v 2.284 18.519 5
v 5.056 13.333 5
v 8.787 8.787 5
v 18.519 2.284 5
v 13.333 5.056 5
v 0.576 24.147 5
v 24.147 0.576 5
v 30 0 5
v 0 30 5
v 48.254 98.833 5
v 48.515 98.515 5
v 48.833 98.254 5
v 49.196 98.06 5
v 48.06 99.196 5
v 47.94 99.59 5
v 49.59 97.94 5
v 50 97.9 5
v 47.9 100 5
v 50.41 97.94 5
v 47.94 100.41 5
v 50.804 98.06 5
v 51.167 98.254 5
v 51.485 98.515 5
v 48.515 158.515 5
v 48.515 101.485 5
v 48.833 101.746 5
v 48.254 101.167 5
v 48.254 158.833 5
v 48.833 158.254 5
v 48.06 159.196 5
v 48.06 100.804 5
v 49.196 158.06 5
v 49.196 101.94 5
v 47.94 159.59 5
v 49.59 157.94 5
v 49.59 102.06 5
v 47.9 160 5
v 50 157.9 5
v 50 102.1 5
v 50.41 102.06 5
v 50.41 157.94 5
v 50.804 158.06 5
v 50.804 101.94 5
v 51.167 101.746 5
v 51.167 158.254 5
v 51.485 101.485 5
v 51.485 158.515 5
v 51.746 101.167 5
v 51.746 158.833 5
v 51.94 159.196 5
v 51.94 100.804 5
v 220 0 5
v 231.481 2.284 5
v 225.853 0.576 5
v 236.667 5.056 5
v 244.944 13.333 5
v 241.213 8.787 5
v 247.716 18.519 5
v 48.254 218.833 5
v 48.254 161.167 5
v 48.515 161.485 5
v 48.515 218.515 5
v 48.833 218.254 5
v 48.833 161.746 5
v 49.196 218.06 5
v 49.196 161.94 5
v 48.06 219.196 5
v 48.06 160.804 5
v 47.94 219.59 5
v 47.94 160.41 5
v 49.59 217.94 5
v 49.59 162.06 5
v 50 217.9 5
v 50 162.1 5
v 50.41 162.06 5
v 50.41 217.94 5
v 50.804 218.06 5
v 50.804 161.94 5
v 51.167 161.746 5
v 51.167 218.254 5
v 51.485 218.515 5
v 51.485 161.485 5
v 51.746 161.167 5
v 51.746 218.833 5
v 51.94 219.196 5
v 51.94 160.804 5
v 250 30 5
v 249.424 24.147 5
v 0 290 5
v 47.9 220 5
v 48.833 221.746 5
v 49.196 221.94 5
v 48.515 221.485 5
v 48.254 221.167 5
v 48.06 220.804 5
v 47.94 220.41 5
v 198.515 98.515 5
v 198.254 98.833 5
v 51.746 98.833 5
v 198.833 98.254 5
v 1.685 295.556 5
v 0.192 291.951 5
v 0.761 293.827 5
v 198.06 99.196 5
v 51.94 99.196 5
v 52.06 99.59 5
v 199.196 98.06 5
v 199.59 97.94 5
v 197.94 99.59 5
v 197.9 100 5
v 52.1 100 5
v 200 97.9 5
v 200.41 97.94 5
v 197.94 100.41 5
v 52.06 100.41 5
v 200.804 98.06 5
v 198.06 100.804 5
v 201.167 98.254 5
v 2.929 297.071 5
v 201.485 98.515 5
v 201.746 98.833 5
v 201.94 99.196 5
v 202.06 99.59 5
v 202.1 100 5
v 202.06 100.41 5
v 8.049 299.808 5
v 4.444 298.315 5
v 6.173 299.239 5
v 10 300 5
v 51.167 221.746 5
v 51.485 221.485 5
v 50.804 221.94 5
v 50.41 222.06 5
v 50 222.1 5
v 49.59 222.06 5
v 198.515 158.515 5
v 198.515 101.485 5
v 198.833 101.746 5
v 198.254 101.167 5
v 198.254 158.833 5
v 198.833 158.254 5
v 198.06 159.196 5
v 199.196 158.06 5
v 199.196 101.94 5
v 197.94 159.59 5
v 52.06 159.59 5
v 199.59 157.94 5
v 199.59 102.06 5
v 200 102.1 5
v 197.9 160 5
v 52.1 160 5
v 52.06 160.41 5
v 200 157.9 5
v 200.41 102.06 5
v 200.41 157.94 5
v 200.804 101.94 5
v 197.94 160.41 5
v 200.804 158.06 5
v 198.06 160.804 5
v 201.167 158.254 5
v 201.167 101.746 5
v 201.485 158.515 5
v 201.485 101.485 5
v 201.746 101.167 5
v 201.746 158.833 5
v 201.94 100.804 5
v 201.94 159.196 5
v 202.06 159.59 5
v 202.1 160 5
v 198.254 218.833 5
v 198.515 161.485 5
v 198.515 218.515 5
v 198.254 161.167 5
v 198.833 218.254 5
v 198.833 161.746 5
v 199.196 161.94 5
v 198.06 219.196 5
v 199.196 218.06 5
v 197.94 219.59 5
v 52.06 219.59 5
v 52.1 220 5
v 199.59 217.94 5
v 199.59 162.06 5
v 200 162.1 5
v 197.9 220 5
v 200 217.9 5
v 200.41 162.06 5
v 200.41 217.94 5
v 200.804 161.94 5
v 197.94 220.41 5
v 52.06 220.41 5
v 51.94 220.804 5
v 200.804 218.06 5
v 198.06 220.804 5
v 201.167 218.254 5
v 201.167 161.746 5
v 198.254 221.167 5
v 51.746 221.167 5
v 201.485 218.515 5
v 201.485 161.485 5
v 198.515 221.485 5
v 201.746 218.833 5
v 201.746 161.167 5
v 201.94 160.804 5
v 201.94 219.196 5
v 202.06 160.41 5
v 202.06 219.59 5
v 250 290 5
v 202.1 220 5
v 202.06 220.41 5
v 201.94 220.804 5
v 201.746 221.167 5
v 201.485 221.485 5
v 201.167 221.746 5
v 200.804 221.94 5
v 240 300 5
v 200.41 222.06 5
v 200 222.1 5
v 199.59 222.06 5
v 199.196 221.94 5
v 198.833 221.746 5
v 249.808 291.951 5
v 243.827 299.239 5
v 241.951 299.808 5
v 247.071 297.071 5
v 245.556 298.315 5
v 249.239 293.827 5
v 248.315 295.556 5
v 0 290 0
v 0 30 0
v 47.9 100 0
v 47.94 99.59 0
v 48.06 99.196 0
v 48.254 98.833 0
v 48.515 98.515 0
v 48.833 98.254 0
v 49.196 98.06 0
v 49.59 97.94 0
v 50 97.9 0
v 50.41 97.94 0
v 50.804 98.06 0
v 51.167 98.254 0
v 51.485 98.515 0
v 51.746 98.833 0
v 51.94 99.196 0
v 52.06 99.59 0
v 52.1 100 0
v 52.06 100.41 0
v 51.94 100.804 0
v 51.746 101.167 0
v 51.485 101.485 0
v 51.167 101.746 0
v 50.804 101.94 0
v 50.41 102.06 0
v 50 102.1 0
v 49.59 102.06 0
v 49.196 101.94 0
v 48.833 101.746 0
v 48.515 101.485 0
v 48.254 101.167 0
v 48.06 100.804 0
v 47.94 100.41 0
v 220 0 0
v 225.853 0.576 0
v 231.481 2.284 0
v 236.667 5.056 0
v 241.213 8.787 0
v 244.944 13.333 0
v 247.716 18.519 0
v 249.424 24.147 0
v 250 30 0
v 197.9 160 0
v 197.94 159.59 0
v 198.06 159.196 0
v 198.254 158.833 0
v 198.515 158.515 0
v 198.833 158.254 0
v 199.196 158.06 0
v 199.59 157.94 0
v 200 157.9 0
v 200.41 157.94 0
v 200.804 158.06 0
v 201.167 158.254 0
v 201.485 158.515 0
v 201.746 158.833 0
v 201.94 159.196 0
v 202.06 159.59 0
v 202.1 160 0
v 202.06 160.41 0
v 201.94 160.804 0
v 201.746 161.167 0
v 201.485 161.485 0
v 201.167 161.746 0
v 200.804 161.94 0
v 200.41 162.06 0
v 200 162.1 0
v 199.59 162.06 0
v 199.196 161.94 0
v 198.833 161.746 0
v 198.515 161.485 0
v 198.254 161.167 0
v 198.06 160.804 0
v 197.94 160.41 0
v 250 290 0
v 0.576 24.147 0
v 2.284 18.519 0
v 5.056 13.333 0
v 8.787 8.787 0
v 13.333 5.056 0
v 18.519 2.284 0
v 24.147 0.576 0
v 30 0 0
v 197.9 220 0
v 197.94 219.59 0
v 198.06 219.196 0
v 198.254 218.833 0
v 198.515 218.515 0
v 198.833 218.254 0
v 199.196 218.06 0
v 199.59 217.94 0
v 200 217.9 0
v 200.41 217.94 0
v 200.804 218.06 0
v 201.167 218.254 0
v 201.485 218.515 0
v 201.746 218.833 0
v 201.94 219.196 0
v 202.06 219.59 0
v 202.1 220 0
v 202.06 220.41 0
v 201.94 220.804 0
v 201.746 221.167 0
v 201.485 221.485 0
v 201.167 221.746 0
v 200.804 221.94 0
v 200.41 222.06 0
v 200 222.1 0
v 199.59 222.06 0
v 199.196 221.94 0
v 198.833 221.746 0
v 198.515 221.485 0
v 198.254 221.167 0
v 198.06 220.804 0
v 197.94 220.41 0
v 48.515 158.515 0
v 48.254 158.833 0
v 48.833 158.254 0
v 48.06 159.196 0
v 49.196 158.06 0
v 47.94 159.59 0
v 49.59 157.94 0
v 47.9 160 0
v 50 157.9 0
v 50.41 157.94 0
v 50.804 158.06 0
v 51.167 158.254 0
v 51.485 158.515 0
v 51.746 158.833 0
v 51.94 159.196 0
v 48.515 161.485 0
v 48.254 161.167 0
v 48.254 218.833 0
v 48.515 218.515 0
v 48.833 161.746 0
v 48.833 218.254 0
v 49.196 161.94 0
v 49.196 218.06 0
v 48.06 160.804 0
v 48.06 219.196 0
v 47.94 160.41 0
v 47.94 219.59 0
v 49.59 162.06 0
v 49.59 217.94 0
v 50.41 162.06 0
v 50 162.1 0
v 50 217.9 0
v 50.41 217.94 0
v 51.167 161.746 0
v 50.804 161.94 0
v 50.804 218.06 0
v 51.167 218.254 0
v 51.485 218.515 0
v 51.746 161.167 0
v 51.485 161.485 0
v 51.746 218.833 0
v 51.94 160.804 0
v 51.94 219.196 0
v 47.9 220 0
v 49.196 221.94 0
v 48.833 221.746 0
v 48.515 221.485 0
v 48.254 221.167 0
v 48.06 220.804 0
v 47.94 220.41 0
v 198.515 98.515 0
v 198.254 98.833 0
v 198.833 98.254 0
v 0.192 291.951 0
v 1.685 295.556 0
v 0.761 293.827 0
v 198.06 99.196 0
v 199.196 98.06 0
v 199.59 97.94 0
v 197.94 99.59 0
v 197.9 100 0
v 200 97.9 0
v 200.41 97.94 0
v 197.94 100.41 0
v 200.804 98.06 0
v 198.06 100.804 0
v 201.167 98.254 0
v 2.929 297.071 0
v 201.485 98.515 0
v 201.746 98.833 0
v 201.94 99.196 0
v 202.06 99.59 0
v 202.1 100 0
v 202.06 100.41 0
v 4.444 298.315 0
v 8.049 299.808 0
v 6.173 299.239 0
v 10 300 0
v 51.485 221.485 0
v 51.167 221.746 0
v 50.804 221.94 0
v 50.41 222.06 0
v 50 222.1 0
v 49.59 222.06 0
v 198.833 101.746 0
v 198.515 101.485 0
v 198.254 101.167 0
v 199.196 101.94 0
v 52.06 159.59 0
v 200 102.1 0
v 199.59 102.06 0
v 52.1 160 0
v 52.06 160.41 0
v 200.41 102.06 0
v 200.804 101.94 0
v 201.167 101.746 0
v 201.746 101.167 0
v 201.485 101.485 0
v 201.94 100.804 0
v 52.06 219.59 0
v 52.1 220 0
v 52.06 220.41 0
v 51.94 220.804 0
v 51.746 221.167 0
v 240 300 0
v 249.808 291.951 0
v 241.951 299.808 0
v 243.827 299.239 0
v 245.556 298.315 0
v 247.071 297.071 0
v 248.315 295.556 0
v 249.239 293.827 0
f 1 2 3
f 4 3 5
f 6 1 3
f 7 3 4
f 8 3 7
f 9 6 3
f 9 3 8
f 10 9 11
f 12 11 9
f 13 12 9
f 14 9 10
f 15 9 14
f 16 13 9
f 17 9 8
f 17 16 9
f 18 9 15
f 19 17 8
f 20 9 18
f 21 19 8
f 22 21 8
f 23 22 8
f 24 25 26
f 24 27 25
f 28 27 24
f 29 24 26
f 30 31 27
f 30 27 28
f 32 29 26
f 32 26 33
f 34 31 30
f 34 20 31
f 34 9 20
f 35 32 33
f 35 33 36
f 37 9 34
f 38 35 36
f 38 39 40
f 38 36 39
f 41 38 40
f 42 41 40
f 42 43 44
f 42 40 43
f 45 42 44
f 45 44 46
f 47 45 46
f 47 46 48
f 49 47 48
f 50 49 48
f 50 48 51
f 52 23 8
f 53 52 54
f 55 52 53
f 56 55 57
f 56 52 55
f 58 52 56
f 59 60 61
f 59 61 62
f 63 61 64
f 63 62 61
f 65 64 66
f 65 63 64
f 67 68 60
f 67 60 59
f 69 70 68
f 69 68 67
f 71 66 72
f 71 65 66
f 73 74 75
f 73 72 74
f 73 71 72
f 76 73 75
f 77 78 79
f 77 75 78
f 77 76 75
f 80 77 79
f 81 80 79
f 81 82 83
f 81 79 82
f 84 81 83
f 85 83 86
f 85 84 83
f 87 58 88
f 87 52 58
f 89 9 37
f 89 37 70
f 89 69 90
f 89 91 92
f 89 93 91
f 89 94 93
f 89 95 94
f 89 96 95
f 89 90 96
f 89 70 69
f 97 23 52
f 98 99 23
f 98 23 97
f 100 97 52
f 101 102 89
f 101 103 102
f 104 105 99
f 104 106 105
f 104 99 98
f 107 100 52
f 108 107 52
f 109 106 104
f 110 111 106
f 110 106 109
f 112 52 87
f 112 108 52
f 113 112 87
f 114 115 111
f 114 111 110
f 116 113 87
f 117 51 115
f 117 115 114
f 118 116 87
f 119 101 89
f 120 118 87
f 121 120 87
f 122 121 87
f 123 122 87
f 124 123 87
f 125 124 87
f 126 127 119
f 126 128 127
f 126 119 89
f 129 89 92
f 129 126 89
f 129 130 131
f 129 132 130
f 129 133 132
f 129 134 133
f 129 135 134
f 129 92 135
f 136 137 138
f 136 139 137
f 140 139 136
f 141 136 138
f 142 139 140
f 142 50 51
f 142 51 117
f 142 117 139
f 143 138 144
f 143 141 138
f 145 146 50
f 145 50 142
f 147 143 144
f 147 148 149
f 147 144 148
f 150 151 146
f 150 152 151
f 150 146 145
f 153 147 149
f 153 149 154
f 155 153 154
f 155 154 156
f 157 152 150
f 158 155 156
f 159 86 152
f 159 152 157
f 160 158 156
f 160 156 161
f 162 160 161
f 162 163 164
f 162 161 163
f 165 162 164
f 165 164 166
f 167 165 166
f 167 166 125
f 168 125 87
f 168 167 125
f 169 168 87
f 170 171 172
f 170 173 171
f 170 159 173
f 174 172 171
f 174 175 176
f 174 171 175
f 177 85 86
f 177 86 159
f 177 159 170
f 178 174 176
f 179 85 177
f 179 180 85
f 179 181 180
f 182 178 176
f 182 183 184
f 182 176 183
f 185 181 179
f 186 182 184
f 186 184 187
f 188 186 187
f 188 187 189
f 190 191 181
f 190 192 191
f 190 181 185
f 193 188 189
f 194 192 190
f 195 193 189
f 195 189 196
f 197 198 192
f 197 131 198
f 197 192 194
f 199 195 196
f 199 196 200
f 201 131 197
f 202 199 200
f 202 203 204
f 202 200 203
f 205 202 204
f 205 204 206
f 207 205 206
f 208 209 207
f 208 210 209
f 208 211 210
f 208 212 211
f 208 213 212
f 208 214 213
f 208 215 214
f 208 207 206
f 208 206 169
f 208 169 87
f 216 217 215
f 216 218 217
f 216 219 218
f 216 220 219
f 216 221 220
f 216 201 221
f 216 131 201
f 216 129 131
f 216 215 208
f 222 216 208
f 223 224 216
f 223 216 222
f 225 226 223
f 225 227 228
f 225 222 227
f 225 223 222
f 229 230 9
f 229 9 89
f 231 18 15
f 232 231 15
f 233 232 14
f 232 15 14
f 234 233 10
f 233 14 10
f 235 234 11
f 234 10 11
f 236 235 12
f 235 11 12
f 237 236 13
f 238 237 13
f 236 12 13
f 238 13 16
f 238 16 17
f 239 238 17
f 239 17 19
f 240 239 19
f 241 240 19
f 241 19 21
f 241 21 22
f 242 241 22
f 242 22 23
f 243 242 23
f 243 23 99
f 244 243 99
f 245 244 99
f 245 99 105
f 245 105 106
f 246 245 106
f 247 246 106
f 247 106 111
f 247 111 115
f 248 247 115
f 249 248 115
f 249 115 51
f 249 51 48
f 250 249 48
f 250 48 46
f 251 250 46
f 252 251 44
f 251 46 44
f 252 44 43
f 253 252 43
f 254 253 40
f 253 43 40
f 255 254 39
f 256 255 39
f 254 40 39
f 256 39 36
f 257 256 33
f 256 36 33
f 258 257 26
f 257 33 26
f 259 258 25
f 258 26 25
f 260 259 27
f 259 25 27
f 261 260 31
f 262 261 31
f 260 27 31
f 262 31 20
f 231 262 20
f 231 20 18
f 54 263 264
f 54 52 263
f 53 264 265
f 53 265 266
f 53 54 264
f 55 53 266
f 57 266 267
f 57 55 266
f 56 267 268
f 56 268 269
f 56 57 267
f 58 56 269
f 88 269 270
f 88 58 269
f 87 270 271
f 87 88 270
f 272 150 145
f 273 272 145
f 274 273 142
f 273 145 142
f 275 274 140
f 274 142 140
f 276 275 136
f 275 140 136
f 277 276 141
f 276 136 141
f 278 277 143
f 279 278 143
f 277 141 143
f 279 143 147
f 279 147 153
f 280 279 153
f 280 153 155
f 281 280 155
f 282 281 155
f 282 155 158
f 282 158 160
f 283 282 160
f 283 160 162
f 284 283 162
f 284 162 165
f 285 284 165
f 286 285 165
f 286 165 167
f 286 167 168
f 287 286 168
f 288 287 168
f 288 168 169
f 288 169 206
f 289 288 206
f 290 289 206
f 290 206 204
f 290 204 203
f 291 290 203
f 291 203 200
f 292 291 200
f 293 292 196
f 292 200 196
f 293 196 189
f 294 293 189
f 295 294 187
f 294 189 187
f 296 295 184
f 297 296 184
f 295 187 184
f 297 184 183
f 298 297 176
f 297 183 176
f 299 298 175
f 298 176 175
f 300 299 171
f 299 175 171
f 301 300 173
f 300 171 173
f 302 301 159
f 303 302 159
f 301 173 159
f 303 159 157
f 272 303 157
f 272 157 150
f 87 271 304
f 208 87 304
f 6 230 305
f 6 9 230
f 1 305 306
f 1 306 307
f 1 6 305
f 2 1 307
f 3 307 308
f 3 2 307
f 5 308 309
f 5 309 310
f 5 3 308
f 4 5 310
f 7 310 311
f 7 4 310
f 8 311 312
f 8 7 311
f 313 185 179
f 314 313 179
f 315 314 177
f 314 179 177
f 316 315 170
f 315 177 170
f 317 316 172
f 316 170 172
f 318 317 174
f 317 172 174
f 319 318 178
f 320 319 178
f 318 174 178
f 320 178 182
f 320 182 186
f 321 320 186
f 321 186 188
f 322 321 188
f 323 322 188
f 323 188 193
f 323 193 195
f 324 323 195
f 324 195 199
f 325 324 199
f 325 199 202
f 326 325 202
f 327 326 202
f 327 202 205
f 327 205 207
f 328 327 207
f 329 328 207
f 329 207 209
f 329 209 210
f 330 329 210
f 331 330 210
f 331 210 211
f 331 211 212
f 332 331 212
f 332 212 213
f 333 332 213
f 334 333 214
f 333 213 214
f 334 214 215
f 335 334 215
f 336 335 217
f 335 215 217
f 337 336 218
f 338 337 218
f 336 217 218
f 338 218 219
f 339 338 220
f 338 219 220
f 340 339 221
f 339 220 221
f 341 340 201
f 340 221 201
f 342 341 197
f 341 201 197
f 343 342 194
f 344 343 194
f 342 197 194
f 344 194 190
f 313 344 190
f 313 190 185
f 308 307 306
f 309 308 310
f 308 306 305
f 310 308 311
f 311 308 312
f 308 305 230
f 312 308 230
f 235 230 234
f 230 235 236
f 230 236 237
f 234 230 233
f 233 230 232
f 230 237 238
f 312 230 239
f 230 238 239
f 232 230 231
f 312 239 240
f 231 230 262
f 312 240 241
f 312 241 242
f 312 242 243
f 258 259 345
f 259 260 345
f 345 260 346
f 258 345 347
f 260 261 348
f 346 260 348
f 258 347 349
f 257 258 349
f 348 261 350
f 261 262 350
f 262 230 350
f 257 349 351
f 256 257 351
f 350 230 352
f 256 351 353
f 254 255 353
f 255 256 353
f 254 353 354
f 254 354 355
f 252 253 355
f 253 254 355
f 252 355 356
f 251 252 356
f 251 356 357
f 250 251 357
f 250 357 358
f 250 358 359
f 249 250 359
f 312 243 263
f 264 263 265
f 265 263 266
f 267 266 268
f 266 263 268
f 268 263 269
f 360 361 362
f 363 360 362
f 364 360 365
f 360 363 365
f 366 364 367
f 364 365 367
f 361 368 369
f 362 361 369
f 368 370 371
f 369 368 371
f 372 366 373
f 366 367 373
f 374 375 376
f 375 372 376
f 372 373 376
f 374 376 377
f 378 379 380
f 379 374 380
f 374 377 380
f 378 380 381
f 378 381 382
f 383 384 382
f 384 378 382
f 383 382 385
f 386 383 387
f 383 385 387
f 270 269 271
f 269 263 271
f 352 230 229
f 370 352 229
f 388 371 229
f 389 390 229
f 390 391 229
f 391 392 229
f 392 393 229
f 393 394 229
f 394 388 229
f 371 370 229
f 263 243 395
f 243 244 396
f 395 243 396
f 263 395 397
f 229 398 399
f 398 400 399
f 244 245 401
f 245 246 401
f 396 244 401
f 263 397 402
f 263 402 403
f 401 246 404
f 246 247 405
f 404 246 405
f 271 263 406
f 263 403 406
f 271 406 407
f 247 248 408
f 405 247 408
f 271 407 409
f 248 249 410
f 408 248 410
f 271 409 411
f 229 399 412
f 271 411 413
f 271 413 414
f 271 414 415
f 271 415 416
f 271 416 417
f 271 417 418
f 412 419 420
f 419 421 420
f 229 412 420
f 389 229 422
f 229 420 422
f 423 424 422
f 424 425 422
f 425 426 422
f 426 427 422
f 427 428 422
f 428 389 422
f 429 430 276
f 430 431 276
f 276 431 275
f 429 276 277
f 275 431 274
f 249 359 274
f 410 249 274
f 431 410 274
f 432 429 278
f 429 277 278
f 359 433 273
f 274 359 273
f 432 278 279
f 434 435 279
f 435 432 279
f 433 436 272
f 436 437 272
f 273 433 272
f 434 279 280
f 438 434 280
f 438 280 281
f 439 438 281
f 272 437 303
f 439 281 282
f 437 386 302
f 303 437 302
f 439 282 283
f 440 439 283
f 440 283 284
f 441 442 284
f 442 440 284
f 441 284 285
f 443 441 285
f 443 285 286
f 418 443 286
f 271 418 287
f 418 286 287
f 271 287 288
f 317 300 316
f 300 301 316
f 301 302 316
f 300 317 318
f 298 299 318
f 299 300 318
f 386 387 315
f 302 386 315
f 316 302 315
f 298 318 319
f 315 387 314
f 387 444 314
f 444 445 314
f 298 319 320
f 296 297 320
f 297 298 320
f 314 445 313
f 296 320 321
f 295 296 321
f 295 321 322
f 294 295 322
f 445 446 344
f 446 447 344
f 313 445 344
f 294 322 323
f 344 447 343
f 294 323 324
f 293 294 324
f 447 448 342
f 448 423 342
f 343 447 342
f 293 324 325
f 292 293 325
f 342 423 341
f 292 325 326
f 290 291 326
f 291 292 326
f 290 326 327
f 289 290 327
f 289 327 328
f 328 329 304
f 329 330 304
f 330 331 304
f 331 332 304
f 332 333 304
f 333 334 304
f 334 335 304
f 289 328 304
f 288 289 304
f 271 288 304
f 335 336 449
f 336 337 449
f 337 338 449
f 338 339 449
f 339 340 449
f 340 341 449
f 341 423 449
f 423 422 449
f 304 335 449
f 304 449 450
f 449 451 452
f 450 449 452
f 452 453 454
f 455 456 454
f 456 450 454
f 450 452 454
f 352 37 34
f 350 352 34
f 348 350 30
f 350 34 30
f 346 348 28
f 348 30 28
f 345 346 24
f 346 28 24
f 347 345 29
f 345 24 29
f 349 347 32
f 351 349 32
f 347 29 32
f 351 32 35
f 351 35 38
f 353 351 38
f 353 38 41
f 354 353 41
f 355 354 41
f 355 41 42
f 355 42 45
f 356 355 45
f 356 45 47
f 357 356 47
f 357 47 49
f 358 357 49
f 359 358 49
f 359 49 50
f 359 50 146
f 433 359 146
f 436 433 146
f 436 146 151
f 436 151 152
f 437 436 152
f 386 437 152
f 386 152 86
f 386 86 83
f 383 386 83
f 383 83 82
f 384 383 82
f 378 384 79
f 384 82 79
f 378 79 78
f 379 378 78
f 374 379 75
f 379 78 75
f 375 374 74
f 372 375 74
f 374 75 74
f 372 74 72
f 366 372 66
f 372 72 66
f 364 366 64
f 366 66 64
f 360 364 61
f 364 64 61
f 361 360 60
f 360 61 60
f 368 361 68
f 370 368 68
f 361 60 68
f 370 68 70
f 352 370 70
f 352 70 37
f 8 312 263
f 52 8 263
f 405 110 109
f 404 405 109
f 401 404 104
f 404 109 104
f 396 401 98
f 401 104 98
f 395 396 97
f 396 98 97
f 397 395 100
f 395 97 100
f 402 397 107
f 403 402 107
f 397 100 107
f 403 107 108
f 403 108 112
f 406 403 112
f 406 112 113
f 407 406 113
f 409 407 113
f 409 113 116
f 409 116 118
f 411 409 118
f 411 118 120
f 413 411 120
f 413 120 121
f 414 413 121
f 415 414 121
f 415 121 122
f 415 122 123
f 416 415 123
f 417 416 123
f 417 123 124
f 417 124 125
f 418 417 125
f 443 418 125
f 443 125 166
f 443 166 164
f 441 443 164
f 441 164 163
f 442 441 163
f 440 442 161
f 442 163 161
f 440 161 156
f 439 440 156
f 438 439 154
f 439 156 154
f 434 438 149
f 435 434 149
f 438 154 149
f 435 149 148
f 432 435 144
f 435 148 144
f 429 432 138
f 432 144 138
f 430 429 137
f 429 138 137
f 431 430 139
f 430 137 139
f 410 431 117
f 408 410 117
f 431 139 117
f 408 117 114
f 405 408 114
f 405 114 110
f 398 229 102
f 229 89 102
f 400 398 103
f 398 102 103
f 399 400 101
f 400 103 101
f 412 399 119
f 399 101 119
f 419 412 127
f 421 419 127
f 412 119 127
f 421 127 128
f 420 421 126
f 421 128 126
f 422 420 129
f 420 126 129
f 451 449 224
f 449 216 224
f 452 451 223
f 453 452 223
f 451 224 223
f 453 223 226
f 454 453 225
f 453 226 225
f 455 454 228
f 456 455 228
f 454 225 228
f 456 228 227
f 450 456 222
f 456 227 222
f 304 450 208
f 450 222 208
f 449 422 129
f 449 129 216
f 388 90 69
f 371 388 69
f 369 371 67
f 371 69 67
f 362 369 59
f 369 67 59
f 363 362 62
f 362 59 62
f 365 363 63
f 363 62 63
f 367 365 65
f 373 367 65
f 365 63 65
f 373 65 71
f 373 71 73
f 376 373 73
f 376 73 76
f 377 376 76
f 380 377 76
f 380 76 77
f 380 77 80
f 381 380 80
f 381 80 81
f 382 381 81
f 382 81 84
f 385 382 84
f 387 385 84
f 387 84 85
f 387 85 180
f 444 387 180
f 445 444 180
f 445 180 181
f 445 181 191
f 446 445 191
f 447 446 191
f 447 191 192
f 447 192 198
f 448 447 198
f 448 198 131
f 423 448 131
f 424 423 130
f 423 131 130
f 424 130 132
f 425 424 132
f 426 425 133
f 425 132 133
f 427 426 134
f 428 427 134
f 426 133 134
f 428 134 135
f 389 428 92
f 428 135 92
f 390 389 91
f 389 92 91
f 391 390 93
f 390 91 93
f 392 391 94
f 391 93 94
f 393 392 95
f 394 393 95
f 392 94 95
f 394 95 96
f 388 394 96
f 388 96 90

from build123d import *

# Parameters (mm, degrees)
F0_W     = 250
F0_H     = 300
F1_DEPTH = 5
F3_D     = 4.2
F4_R     = 10
F5_R     = 30


with BuildPart() as f1:
    # F0 (on Top) → F1 (new body)
    with BuildSketch(Plane.XY):
        with Locations((125, 150)):
            Rectangle(F0_W, F0_H)
    extrude(amount=F1_DEPTH)

    # F3 (through all)
    with Locations(Plane(origin=(0, 0, 0), x_dir=(1, 0, 0), z_dir=(0, 0, -1))):
        with Locations((50, -220), (50, -160), (200, -220), (200, -160), (200, -100), (50, -100)):
            Hole(F3_D / 2)

    # F4
    f4_edges = [f1.edges().sort_by_distance(p)[0] for p in [
        (0, 300, 2.5),
        (250, 300, 2.5),
    ]]
    fillet(f4_edges, radius=F4_R)

    # F5
    f5_edges = [f1.edges().sort_by_distance(p)[0] for p in [
        (0, 0, 2.5),
        (250, 0, 2.5),
    ]]
    fillet(f5_edges, radius=F5_R)


solid = f1.part
